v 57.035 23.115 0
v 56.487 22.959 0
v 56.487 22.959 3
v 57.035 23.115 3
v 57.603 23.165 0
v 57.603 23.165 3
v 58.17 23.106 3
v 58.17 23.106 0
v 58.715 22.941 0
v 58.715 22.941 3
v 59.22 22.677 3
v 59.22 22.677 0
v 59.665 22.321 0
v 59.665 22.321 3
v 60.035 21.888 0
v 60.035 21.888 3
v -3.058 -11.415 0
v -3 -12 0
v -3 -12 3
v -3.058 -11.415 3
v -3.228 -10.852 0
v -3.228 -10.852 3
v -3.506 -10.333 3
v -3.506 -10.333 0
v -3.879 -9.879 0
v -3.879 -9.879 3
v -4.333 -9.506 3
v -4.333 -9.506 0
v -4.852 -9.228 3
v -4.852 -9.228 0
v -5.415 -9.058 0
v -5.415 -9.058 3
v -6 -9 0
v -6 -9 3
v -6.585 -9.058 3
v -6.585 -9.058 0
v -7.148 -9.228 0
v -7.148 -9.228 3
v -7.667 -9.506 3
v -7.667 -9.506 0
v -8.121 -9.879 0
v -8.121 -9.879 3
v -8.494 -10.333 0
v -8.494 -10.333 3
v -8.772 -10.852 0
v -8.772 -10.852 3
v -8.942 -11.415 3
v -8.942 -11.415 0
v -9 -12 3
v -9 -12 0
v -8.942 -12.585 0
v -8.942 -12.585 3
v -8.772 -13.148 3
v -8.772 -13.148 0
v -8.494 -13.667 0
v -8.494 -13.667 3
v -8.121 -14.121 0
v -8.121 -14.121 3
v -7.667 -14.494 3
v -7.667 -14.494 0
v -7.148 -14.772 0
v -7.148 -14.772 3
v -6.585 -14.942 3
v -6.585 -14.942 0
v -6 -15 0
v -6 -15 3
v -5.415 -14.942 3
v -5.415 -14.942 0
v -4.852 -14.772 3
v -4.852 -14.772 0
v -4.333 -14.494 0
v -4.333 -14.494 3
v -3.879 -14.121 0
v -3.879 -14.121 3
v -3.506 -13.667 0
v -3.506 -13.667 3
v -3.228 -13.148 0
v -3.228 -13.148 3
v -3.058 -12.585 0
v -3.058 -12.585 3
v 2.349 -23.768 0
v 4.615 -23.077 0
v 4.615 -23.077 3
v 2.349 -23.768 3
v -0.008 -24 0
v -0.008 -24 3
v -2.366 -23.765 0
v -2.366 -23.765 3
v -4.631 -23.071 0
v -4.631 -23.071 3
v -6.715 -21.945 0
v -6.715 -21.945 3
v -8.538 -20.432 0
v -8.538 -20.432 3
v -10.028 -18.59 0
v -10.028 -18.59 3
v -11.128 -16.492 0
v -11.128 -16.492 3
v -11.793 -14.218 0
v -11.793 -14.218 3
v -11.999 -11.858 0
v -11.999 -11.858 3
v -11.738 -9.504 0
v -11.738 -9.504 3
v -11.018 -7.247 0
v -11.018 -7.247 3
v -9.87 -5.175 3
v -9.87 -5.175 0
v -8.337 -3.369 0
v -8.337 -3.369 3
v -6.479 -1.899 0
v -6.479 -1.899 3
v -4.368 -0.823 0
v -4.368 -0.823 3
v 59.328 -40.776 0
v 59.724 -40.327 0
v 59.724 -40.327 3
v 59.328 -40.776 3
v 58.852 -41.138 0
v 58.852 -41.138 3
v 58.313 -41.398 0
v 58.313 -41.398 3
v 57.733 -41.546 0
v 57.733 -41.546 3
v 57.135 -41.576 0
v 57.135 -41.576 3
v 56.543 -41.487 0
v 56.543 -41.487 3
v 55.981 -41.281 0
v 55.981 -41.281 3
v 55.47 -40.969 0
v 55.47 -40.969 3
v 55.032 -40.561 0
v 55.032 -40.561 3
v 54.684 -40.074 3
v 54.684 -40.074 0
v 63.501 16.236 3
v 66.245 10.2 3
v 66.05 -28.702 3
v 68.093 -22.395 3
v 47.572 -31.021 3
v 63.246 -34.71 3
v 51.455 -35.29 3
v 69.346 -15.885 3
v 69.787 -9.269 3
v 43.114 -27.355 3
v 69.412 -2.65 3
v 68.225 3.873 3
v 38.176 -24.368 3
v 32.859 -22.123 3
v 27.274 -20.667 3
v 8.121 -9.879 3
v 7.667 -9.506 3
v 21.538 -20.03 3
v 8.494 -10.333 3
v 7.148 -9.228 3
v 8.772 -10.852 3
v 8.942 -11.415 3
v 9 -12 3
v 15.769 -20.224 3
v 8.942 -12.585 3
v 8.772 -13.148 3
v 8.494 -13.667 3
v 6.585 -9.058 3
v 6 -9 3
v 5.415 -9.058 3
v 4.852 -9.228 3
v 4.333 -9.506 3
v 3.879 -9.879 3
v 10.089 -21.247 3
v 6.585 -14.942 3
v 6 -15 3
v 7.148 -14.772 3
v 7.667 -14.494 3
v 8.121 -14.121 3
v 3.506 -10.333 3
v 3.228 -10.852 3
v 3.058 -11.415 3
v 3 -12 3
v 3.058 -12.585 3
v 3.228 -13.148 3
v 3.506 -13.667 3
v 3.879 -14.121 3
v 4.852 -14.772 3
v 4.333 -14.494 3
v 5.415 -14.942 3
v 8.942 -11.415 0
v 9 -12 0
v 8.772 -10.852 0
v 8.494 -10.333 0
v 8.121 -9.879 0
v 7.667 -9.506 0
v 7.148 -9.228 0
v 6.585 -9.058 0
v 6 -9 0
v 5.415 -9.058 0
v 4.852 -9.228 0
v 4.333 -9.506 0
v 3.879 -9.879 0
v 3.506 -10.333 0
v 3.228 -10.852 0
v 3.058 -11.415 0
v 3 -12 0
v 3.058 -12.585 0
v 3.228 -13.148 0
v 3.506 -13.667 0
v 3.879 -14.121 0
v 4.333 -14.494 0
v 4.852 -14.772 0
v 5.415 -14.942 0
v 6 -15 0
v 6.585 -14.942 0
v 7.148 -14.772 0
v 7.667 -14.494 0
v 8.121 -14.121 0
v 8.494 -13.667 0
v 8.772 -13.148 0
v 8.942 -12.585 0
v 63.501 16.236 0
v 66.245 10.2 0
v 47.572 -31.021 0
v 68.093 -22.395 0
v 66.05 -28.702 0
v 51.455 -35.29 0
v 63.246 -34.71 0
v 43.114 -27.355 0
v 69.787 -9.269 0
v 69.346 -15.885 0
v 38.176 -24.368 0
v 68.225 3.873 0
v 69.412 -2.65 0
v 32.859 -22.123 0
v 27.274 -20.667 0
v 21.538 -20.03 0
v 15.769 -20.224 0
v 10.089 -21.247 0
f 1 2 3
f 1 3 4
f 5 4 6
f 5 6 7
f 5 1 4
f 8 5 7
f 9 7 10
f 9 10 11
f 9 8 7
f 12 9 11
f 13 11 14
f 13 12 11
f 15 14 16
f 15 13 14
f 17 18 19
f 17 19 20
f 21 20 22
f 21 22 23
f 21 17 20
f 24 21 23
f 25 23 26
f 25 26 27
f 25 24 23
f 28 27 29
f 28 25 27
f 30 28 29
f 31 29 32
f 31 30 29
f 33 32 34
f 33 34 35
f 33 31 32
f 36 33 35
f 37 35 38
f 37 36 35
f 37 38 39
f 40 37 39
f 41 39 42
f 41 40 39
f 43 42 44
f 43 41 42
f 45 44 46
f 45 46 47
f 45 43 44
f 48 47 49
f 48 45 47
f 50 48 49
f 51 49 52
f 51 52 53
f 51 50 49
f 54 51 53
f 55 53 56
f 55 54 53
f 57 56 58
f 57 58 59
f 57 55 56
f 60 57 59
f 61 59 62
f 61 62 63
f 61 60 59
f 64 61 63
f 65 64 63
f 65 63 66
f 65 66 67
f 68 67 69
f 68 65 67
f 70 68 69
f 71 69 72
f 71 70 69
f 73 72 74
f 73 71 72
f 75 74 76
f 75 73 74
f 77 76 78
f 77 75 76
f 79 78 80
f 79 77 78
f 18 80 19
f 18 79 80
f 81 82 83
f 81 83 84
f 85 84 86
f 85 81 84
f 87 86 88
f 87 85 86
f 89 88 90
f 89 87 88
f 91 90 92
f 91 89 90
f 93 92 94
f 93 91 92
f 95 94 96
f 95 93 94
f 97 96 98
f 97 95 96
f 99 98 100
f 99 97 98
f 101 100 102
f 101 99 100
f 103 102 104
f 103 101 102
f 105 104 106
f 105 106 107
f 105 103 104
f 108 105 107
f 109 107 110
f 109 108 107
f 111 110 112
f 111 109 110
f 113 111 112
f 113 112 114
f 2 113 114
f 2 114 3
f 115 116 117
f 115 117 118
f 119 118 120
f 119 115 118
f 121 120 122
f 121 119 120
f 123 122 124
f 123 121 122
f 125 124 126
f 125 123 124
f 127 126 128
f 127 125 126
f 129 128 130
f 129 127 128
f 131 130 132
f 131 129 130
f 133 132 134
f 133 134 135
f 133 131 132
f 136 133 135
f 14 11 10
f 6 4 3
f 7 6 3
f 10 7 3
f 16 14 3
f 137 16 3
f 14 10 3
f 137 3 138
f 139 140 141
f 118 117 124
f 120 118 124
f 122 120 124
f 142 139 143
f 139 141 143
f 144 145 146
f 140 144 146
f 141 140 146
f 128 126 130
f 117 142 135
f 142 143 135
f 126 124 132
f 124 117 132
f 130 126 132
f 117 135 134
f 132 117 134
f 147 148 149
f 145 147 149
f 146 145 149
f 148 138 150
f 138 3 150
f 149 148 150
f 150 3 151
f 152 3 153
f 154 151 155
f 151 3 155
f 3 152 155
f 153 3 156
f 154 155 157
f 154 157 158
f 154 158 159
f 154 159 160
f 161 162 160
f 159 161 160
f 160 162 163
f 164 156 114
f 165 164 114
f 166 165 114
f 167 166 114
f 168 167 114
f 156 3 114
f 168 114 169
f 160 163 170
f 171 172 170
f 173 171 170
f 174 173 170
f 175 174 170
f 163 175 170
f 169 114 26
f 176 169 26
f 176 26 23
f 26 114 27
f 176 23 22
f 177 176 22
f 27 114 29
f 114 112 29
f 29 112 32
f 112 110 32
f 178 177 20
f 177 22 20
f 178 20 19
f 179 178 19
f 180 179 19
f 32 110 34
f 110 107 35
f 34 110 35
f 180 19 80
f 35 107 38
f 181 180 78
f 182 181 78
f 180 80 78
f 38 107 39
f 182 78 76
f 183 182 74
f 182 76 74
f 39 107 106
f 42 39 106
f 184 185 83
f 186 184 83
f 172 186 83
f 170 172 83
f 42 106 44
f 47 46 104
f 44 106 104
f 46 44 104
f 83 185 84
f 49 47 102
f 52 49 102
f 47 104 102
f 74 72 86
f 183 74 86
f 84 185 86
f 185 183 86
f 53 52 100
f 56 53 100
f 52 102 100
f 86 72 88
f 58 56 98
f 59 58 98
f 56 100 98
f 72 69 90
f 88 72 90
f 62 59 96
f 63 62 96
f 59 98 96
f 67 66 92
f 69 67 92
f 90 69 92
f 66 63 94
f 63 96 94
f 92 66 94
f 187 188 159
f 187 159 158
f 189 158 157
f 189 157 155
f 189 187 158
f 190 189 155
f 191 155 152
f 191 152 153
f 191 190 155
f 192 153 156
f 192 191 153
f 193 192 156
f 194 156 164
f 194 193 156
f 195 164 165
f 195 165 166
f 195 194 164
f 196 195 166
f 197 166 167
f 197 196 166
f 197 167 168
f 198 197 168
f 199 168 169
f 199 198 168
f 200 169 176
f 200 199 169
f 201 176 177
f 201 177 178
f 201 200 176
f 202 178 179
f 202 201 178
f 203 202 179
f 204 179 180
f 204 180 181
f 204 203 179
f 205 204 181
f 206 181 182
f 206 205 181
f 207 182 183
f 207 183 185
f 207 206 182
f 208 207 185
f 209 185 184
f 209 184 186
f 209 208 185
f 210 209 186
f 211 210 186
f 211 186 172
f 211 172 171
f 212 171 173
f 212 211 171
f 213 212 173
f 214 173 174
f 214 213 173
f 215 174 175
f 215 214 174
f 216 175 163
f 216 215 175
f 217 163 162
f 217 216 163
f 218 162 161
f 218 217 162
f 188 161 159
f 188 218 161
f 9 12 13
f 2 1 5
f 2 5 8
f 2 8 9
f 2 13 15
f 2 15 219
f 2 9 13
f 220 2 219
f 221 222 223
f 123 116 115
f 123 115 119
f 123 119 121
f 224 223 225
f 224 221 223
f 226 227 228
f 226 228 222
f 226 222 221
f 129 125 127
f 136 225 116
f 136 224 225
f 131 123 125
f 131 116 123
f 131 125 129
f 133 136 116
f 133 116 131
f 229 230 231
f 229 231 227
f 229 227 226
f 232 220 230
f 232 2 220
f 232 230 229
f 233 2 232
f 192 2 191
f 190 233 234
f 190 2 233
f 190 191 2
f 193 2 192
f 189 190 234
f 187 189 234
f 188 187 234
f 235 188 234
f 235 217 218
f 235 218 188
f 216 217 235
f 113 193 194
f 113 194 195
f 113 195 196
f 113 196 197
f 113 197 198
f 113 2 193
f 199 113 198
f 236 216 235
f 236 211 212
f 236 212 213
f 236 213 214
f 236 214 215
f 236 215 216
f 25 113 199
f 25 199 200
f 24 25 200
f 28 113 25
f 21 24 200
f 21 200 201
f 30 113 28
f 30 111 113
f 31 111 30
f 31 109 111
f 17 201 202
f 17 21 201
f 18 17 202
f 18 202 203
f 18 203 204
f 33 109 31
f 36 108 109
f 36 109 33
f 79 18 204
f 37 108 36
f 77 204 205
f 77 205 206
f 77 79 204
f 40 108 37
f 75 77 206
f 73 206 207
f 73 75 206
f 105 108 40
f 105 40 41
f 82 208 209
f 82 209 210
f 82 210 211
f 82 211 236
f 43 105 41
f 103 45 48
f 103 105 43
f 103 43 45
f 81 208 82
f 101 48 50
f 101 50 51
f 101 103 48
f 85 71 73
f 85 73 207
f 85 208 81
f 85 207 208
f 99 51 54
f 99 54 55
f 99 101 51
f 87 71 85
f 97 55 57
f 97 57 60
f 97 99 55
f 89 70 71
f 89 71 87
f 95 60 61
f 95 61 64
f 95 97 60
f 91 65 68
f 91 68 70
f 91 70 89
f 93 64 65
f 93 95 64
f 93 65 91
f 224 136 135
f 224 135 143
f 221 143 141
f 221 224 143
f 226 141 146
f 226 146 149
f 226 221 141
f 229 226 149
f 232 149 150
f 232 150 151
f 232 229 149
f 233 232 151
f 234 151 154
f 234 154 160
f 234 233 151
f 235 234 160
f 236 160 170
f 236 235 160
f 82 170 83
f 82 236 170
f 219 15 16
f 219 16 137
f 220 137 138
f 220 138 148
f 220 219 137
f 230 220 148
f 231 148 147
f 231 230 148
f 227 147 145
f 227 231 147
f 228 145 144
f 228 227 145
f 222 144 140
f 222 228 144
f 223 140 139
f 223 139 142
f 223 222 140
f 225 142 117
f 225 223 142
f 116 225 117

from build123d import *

# Parameters (mm, degrees)
SKETCH1_R           = 3
BOSS_EXTRUDE1_DEPTH = 3


with BuildPart() as part:
    # Sketch1 → Boss-Extrude1 (new body)
    with BuildSketch(Plane(origin=(0, 0, 0), x_dir=(0, 1, 0), z_dir=(0, 0, 1))):
        with BuildLine():
            Line((-0.823178029, 4.367911471), (22.959093686, -56.487309327))
            ThreePointArc((22.959093686, -56.487309327), (23.036789975, -58.446570398), (21.887628759, -60.035333804))
            ThreePointArc((21.887628759, -60.035333804), (-9.269367484, -69.787393269), (-40.327126668, -59.723762055))
            ThreePointArc((-40.327126668, -59.723762055), (-41.576105768, -57.134789232), (-40.074300788, -54.683807619))
            ThreePointArc((-40.074300788, -54.683807619), (-22.12312602, -32.858554253), (-23.076923077, -4.615384615))
            ThreePointArc((-23.076923077, -4.615384615), (-16.491925767, 11.12756051), (-0.823178029, 4.367911471))
        make_face()
        with Locations(Location((-12, 6, 0), (0, 0, 270))):
            Circle(SKETCH1_R, mode=Mode.SUBTRACT)
        with Locations(Location((-12, -6, 0), (0, 0, 270))):
            Circle(SKETCH1_R, mode=Mode.SUBTRACT)
    extrude(amount=BOSS_EXTRUDE1_DEPTH)


solid = part.part
